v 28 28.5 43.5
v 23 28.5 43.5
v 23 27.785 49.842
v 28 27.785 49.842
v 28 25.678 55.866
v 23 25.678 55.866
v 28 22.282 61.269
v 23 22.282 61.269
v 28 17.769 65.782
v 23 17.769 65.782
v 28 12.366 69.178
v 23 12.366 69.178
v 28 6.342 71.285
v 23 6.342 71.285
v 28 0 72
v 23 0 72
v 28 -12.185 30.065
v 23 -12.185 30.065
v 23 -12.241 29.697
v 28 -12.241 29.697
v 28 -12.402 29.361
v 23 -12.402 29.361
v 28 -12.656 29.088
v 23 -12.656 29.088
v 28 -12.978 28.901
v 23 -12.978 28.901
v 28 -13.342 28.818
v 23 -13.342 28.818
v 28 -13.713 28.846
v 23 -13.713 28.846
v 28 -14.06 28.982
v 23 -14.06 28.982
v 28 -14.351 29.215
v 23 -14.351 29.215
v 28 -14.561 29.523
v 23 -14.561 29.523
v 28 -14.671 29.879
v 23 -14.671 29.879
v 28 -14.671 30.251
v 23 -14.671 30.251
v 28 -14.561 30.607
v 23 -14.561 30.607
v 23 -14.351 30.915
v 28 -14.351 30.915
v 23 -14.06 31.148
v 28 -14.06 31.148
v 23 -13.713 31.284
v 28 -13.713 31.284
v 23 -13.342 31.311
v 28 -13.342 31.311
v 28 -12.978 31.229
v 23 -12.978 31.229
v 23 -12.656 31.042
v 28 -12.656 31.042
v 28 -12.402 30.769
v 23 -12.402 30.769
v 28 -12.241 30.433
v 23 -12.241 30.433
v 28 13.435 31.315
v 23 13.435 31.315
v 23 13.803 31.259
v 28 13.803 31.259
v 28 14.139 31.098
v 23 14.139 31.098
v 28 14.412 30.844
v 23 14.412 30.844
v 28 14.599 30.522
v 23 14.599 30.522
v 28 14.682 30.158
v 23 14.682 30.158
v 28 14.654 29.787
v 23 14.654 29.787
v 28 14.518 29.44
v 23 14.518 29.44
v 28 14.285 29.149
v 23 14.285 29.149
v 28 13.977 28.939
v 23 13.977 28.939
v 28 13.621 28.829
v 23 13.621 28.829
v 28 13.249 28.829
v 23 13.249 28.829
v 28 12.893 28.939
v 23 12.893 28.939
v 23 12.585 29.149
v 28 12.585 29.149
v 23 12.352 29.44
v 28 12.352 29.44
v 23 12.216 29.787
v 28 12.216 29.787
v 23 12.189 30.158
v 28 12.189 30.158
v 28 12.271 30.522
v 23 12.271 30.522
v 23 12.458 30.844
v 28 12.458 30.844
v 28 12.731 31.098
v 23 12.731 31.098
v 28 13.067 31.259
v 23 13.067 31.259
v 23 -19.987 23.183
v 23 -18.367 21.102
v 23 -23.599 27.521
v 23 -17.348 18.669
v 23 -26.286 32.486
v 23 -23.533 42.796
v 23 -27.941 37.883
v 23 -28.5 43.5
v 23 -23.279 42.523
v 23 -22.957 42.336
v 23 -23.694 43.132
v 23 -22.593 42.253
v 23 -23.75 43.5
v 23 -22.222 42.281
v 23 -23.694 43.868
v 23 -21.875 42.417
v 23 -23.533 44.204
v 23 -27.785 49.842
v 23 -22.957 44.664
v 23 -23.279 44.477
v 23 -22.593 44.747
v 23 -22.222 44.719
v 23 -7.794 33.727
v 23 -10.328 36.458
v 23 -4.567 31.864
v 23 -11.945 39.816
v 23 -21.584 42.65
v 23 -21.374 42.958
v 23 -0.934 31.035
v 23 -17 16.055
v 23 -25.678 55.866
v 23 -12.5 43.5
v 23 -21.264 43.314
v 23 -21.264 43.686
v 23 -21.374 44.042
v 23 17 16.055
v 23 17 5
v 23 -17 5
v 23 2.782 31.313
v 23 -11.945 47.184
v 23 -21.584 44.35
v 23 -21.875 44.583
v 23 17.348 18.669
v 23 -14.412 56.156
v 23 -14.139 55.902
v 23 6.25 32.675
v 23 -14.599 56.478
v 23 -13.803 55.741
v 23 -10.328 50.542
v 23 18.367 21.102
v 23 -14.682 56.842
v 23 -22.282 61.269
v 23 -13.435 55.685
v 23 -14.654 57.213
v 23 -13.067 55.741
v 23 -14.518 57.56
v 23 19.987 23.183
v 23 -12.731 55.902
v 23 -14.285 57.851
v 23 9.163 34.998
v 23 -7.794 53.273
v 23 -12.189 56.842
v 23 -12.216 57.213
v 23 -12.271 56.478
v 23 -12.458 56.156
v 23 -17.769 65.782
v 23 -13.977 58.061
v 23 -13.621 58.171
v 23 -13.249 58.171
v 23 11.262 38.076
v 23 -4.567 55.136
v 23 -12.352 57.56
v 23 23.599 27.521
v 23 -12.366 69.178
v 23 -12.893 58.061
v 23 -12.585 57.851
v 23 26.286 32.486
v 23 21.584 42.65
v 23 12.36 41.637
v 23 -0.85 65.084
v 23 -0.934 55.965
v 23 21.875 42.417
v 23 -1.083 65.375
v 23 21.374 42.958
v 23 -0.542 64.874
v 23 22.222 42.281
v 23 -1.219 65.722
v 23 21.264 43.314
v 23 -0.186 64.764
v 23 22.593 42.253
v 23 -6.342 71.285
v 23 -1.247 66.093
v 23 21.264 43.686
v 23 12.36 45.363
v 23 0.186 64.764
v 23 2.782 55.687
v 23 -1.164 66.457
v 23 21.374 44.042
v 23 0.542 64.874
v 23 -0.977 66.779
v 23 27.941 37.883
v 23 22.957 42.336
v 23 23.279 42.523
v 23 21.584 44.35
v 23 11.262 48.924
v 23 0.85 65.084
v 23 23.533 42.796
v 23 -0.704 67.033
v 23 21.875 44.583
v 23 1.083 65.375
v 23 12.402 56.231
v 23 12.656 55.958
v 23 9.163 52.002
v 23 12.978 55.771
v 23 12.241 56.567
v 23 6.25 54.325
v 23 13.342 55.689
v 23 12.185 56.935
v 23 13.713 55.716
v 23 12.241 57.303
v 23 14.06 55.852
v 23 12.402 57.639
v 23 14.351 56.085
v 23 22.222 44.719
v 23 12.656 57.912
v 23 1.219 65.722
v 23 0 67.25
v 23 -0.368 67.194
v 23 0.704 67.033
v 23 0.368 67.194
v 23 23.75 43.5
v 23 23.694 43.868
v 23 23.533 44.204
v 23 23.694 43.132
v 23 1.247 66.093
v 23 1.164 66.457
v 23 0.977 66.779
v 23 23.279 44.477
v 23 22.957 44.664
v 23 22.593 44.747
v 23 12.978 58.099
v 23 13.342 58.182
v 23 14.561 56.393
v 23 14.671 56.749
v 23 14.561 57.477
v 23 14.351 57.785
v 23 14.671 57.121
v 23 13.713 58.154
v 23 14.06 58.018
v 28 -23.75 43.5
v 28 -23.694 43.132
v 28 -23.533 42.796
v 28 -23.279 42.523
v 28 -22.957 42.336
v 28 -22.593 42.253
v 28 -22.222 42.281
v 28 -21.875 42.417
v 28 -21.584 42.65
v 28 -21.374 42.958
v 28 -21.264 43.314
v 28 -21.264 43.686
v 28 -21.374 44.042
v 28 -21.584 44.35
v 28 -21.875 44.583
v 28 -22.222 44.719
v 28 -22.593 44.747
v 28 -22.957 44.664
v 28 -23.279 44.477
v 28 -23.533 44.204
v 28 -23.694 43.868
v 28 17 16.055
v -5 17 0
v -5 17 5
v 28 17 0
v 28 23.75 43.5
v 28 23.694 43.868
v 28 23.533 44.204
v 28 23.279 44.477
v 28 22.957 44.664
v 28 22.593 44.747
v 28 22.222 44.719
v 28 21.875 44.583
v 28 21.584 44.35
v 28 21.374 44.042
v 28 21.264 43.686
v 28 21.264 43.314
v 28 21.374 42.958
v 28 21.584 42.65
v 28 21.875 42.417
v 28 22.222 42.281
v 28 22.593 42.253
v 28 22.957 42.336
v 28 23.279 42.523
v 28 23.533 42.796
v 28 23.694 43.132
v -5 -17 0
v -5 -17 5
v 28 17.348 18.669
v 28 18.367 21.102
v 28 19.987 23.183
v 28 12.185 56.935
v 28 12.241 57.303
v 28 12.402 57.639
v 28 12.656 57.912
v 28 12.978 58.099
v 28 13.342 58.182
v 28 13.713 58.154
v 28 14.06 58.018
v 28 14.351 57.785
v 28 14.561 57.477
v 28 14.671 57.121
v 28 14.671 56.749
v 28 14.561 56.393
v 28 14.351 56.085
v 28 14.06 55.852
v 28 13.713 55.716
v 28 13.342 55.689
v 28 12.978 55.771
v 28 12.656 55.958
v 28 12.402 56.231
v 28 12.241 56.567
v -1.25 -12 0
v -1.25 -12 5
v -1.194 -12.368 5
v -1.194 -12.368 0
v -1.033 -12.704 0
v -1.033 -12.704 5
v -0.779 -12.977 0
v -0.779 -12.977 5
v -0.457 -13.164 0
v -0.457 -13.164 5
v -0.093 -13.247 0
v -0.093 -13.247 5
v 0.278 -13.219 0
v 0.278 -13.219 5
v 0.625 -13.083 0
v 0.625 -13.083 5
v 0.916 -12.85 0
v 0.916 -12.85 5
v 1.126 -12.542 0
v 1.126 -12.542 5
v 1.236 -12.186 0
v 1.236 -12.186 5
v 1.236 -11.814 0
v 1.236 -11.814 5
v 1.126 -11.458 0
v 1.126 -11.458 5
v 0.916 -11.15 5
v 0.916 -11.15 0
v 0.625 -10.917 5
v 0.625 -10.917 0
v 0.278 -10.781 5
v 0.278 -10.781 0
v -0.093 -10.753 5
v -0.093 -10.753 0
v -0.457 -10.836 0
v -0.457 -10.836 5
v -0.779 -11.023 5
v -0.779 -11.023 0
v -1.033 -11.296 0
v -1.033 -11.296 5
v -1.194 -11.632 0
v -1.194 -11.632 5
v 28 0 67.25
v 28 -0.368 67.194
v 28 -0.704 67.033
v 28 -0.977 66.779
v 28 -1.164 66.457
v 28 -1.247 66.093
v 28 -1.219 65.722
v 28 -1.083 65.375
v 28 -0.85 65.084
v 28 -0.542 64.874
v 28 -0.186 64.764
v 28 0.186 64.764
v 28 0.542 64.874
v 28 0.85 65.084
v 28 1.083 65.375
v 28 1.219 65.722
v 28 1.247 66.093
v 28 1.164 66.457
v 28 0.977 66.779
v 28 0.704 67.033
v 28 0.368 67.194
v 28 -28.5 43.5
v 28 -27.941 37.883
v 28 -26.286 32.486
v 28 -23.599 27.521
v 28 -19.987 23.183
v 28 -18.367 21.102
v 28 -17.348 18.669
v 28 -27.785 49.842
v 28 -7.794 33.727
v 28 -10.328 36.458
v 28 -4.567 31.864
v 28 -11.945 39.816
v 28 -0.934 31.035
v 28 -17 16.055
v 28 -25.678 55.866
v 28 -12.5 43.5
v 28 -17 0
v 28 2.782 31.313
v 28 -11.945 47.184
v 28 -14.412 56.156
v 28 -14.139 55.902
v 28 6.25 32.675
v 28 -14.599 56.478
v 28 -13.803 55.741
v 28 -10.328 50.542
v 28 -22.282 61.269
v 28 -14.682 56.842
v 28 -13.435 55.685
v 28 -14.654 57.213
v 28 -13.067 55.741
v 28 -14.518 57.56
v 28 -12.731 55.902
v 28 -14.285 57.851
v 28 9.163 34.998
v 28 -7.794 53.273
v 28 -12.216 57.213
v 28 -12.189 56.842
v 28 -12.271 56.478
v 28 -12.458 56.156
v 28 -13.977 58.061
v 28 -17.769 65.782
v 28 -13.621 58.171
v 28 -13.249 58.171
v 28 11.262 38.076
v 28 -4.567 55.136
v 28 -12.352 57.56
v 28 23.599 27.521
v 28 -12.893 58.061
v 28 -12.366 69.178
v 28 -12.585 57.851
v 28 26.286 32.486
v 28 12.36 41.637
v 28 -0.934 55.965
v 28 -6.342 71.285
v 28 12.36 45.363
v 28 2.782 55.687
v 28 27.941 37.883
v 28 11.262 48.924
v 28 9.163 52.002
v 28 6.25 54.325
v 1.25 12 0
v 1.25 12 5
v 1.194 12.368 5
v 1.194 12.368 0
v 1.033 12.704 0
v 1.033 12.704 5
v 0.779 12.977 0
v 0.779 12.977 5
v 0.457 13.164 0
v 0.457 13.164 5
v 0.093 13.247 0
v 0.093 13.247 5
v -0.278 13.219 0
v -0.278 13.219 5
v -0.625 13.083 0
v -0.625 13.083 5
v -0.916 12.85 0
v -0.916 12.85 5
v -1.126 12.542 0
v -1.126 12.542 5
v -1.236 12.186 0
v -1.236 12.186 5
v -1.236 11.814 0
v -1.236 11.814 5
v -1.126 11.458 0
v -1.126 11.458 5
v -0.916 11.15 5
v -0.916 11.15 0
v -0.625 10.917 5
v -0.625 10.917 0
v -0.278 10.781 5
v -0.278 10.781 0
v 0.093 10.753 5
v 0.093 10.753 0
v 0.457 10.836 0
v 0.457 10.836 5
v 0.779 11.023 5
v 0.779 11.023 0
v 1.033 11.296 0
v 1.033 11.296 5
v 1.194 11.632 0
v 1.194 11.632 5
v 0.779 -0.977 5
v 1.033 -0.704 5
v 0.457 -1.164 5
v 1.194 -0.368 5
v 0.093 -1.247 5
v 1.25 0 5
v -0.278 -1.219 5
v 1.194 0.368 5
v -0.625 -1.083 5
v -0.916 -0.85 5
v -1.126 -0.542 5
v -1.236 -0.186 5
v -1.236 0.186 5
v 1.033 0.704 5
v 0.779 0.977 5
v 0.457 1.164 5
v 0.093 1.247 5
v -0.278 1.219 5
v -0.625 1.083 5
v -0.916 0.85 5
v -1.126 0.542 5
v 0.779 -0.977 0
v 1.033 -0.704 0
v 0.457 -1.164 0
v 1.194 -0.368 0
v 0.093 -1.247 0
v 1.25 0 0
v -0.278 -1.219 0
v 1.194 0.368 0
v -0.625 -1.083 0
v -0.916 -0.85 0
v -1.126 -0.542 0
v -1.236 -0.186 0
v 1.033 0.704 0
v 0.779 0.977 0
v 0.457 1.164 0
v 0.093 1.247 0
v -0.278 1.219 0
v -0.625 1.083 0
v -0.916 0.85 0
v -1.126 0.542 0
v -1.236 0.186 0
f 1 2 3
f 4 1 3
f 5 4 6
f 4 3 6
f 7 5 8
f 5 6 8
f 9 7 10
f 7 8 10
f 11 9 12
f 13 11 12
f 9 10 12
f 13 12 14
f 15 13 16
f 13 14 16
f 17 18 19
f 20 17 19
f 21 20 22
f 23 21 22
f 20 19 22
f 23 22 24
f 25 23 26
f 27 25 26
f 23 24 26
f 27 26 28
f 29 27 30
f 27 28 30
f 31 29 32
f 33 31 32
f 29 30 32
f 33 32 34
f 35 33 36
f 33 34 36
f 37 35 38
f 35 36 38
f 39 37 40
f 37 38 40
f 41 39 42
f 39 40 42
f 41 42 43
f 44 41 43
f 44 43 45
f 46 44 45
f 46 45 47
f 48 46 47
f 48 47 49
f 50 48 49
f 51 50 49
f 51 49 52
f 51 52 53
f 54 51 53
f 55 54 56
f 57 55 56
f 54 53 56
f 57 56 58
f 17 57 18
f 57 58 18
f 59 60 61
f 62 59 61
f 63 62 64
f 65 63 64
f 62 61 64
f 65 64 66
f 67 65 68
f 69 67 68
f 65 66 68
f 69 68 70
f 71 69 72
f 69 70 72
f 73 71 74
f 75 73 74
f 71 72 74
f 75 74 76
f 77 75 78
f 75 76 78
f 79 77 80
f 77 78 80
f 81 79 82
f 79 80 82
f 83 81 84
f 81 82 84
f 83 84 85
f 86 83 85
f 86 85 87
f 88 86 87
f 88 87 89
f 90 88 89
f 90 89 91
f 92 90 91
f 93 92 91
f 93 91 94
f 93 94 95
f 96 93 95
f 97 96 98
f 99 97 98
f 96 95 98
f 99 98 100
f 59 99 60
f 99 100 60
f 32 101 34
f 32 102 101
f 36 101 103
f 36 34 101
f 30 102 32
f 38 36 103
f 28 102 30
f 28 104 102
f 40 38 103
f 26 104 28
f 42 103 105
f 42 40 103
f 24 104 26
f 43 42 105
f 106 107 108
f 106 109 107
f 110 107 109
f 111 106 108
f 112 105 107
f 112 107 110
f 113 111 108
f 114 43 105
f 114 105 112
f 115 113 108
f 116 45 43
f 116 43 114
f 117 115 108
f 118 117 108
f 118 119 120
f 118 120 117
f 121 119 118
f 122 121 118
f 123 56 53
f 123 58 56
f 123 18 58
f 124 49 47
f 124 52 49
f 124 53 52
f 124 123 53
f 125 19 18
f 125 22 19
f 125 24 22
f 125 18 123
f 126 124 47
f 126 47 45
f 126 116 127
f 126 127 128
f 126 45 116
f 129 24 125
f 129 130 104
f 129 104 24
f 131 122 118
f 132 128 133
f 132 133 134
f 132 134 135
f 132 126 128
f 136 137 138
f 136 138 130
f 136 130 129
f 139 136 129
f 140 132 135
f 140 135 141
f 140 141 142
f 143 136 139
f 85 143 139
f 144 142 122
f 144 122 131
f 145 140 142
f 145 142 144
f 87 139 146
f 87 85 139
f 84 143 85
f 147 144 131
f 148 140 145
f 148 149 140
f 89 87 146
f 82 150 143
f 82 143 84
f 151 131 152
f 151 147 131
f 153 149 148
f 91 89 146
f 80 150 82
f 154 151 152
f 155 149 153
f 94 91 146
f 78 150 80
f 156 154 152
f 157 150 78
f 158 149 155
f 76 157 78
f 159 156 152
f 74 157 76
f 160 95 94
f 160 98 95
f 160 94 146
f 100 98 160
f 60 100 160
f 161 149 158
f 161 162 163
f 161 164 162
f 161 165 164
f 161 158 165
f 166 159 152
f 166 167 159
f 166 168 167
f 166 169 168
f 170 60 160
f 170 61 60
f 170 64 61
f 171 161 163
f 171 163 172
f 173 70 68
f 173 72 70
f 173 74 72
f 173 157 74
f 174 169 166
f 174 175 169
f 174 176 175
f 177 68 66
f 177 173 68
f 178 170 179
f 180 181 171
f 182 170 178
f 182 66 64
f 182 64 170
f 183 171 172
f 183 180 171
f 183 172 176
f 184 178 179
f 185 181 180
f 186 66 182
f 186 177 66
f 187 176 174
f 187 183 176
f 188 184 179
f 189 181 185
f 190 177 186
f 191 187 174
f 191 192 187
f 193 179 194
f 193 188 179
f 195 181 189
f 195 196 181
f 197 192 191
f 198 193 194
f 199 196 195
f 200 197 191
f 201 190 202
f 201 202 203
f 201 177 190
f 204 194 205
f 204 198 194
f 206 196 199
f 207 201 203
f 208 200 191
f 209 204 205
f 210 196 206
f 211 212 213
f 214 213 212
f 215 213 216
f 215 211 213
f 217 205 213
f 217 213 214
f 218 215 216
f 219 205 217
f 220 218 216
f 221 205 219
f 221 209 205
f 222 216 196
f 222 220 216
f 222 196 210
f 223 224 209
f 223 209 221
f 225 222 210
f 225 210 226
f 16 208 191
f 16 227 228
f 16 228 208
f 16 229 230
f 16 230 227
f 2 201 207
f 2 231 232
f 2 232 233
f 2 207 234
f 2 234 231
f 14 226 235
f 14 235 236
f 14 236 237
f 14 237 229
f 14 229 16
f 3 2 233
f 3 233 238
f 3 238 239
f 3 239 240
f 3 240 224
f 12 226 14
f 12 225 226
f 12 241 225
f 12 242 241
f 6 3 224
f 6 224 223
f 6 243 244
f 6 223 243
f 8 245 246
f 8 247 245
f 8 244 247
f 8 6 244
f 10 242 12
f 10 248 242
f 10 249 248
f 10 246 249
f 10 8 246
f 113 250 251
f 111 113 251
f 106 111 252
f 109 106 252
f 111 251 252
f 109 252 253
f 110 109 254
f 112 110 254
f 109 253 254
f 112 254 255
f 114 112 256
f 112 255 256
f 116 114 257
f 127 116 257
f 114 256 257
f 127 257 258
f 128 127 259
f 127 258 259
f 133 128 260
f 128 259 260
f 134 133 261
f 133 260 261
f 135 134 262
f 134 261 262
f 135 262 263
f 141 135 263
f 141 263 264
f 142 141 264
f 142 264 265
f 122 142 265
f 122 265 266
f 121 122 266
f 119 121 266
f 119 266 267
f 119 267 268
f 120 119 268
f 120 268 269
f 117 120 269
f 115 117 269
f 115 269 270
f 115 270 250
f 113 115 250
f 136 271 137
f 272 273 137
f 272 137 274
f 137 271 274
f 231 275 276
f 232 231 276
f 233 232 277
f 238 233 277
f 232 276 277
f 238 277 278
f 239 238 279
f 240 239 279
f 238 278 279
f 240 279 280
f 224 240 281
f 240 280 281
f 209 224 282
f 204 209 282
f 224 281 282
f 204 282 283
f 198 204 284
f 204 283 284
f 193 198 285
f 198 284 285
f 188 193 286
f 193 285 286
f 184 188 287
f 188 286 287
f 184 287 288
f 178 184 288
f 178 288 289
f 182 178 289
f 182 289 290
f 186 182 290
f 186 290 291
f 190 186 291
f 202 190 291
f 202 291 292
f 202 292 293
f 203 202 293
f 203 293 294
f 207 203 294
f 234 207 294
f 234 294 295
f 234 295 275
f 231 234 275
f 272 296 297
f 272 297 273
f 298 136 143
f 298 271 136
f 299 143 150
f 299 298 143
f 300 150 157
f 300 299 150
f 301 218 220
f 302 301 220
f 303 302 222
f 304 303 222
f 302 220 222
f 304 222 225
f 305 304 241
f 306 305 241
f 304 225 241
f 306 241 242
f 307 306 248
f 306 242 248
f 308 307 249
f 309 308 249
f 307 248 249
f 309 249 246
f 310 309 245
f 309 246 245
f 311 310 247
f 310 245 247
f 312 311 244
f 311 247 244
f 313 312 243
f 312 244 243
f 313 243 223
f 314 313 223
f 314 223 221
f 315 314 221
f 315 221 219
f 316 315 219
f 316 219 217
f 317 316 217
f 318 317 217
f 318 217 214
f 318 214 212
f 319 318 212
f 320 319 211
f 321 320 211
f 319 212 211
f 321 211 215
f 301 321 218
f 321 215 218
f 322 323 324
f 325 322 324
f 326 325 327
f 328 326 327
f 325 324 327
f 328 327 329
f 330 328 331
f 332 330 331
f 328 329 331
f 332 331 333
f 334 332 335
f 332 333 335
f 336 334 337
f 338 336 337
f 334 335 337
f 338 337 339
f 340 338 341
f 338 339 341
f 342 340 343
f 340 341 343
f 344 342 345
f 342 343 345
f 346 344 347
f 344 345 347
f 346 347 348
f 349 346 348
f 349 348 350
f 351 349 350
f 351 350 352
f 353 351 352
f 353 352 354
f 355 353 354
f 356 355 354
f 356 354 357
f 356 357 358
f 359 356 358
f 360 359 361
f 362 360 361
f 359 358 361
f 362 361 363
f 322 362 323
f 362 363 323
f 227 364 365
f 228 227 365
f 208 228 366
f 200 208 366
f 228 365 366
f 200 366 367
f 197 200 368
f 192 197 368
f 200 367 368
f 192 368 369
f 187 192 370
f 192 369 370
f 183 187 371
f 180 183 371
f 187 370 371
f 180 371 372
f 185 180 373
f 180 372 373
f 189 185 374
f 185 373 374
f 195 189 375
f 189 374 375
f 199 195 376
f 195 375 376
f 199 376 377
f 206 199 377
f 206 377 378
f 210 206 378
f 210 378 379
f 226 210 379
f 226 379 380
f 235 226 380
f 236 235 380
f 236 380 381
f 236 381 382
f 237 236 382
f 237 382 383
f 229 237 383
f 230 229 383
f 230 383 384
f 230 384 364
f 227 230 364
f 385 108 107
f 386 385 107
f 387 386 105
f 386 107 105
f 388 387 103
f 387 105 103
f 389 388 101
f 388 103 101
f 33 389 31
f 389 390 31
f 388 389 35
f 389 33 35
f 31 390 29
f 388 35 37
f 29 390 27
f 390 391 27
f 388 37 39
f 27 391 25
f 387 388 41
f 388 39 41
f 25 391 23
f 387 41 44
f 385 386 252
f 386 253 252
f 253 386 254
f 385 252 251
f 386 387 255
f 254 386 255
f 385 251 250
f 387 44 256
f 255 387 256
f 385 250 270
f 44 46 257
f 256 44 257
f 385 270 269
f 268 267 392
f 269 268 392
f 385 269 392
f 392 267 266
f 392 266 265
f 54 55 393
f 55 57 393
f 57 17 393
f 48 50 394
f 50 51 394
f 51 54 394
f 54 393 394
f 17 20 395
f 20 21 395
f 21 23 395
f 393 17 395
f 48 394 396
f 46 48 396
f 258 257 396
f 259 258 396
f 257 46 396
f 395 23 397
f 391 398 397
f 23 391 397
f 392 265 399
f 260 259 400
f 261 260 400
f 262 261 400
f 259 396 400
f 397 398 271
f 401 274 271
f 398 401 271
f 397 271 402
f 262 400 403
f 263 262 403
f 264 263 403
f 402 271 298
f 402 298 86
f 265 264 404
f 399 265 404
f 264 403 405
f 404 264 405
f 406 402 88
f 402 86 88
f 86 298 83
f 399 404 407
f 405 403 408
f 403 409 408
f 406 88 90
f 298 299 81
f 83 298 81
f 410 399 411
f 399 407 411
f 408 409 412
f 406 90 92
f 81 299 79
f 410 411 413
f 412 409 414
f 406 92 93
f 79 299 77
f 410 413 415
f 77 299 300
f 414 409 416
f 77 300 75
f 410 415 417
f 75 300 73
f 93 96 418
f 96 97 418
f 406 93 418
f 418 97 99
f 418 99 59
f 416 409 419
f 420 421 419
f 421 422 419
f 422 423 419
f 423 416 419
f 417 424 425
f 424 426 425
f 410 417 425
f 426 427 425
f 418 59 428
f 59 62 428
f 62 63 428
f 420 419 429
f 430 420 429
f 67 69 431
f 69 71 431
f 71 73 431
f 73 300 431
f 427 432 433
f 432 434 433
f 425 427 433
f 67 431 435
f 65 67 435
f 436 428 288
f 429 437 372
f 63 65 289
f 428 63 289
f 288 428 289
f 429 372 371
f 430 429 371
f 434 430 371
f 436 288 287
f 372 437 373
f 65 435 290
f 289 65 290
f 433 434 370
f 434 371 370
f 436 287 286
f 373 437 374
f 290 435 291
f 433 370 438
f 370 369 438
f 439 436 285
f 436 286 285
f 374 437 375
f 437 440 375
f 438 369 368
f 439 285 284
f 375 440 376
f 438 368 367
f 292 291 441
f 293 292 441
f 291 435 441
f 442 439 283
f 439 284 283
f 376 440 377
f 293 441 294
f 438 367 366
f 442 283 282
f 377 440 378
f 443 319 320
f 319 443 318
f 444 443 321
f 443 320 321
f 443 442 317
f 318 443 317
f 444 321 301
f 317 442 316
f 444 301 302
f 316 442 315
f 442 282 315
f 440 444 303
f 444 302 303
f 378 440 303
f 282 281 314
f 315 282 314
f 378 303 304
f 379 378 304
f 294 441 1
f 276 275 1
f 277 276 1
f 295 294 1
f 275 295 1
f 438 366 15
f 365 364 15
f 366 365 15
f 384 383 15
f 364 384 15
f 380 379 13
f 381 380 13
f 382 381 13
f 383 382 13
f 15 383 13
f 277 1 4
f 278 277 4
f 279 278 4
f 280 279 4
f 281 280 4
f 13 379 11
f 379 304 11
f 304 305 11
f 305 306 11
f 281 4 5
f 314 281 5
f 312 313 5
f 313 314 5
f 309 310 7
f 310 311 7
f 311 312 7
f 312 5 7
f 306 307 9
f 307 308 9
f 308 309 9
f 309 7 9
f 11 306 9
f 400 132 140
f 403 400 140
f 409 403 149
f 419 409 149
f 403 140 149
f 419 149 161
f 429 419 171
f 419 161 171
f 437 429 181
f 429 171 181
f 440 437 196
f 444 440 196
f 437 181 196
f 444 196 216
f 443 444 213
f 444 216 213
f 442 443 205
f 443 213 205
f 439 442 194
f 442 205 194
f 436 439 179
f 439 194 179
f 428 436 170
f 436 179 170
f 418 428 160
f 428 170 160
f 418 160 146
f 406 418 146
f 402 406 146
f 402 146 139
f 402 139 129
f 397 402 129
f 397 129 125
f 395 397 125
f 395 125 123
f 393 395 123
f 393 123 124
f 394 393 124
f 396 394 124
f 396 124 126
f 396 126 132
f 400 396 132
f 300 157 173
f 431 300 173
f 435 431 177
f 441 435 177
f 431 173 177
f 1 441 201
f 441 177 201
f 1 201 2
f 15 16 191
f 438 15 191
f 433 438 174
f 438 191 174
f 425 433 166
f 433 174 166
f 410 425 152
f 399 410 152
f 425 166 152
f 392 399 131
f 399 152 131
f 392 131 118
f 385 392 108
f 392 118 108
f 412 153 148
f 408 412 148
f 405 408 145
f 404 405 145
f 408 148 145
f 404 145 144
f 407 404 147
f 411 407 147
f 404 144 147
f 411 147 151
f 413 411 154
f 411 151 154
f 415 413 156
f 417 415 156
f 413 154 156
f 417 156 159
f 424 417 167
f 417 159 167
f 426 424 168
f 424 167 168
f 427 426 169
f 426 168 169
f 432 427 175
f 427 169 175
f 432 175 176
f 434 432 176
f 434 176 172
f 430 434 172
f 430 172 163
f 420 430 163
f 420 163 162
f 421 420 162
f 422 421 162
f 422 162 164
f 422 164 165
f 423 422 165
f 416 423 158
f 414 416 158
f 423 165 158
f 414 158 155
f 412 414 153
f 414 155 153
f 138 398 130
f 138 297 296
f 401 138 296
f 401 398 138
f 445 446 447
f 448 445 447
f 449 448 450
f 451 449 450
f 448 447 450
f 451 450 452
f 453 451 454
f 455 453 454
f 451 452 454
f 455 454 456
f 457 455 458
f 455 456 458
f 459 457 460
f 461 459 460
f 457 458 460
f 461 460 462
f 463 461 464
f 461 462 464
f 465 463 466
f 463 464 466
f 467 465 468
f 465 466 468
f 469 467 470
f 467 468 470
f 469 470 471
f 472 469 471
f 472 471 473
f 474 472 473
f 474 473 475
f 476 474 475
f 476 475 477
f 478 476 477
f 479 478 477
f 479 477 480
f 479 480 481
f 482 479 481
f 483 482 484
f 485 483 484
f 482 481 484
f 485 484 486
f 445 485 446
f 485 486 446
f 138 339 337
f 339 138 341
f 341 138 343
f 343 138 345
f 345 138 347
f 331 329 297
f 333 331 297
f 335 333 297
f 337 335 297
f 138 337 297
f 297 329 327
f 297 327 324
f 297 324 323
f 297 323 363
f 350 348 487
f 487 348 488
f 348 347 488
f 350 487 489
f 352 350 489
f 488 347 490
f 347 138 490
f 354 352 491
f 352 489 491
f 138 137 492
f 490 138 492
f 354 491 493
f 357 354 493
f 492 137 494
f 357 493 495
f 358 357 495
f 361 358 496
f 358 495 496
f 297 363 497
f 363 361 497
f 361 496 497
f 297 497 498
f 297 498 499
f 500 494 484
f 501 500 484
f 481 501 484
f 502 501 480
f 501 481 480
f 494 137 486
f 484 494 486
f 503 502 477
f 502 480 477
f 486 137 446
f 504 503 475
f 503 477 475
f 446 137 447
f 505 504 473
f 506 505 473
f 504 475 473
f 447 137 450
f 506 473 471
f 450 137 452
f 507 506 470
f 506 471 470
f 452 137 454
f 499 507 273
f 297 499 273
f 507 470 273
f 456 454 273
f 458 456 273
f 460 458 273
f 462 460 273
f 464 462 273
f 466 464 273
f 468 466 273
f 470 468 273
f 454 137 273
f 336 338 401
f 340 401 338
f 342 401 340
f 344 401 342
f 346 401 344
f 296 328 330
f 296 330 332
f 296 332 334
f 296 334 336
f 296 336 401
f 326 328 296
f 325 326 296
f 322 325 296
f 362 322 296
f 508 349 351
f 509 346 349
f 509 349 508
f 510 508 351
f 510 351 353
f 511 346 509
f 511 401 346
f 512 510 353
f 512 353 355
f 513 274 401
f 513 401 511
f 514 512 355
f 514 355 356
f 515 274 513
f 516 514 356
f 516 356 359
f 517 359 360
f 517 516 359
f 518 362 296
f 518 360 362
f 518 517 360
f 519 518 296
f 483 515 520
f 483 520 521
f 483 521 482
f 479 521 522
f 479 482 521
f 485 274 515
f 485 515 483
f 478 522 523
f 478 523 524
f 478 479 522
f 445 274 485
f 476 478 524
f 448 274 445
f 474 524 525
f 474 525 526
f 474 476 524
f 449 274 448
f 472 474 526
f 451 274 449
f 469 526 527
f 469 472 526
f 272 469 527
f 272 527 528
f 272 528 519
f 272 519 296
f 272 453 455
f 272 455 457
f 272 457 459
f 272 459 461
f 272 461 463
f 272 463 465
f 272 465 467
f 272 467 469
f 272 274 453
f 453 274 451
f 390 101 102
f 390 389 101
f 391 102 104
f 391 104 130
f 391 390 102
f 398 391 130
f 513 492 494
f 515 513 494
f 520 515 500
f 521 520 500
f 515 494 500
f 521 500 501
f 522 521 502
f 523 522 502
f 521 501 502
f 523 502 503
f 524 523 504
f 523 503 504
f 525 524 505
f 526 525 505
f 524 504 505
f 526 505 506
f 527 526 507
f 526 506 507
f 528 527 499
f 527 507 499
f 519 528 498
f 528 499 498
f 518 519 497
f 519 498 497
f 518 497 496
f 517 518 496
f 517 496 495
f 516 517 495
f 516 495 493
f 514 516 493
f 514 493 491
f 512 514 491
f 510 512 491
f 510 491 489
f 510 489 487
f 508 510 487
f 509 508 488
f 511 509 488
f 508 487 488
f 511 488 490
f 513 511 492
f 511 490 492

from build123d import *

# Parameters (mm, degrees)
EXTRUDE_1_DEPTH          = 5
SKETCH_2_W               = 67
SKETCH_2_H               = 34
EXTRUDE_2_DEPTH          = 5
SKETCH_4_W               = 57
SKETCH_4_H               = 57
EXTRUDE_3_DEPTH          = 5
CUT_EXTRUDE_1_DEPTH      = 5
FILLET_1_R               = 10
FILLET_2_R               = 10
SKETCH_6_R               = 1.25
SKETCH_6_R_2             = 12.5
CUT_EXTRUDE_2_DEPTH      = 5
PATTERN_CIRCULAR_1_COUNT = 4
SKETCH_7_R               = 1.25
CUT_EXTRUDE_3_DEPTH      = 5
SKETCH_8_R               = 1.25
CUT_EXTRUDE_5_DEPTH      = 10
PATTERN_CIRCULAR_2_COUNT = 3
PATTERN_CIRCULAR_2_ANGLE = 180


with BuildPart() as part:
    # 草图1 → 凸台-拉伸1 (new body)
    with BuildSketch(Plane.XY):
        Polygon((23, 17), (28, 17), (28, -17), (23, -17), (-5, -17), (-5, 17), align=None)
    extrude(amount=EXTRUDE_1_DEPTH)

    # 草图2 → 凸台-拉伸2 (add)
    with BuildSketch(Plane(origin=(28, 0, 0), x_dir=(0, 0, -1), z_dir=(1, 0, 0))):
        with Locations((-38.5, 0)):
            Rectangle(SKETCH_2_W, SKETCH_2_H)
    extrude(amount=-EXTRUDE_2_DEPTH)

    # 草图4 → 凸台-拉伸3 (add)
    with BuildSketch(Plane.ZY.offset(-23)):
        with Locations((43.5, 0)):
            Rectangle(SKETCH_4_W, SKETCH_4_H)
    extrude(amount=-EXTRUDE_3_DEPTH)

    # 草图5 → 切除-拉伸1 (cut)
    with BuildSketch(Plane.ZY.offset(-23)):
        with BuildLine():
            Line((15, 28.5), (15, 17))
            Line((15, 17), (20.625341533, 17))
            ThreePointArc((20.625341533, 17), (30.698632886, 25.463208753), (43.5, 28.5))
            Line((43.5, 28.5), (15, 28.5))
        make_face()
        with BuildLine():
            ThreePointArc((43.500000073, -28.5), (30.698632918, -25.463208769), (20.625341533, -17))
            Line((20.625341533, -17), (15, -17))
            Line((15, -17), (15, -28.5))
            Line((15, -28.5), (43.500000073, -28.5))
        make_face()
        with BuildLine():
            ThreePointArc((72, 0), (63.65254329, -20.152543238), (43.500000073, -28.5))
            Line((43.500000073, -28.5), (72, -28.5))
            Line((72, -28.5), (72, 0))
        make_face()
        with BuildLine():
            Line((72, 28.5), (43.5, 28.5))
            ThreePointArc((43.5, 28.5), (63.652543264, 20.152543264), (72, 0))
            Line((72, 0), (72, 28.5))
        make_face()
    extrude(amount=-CUT_EXTRUDE_1_DEPTH, mode=Mode.SUBTRACT)

    # 圆角1
    fillet_1_edges = [part.edges().sort_by_distance(p)[0] for p in [
        (25.5, 17, 20.625341533),
    ]]
    fillet(fillet_1_edges, radius=FILLET_1_R)

    # 圆角2
    fillet_2_edges = [part.edges().sort_by_distance(p)[0] for p in [
        (25.5, -17, 20.625341533),
    ]]
    fillet(fillet_2_edges, radius=FILLET_2_R)

    # 草图6 → 切除-拉伸2 (cut)
    with BuildSketch(Plane.ZY.offset(-23)):
        with Locations(Location((56.935028843, 13.435028843, 0), (0, 0, 270))):
            Circle(SKETCH_6_R)
        with Locations(Location((43.5, 0, 0), (0, 0, 270))):
            Circle(SKETCH_6_R_2)
    cut_extrude_2 = extrude(amount=-CUT_EXTRUDE_2_DEPTH, mode=Mode.SUBTRACT)

    # 阵列(圆周)1: 切除-拉伸2 ×4 about axis
    pattern_circular_1_axis = Axis((0, 0, 43.5), (1, 0, 0))
    for i in range(1, PATTERN_CIRCULAR_1_COUNT):
        add(cut_extrude_2.rotate(pattern_circular_1_axis, i * 360 / PATTERN_CIRCULAR_1_COUNT), mode=Mode.SUBTRACT)

    # 草图7 → 切除-拉伸3 (cut)
    with BuildSketch(Plane.XY.offset(5)):
        Circle(SKETCH_7_R)
        with Locations((0, 12)):
            Circle(SKETCH_7_R)
        with Locations(Location((0, -12, 0), (0, 0, 180))):
            Circle(SKETCH_7_R)
    extrude(amount=-CUT_EXTRUDE_3_DEPTH, mode=Mode.SUBTRACT)

    # 草图8 → 切除-拉伸5 (cut)
    with BuildSketch(Plane(origin=(28, 0, 0), x_dir=(0, 0, -1), z_dir=(1, 0, 0))):
        with Locations(Location((-43.5, 22.5, 0), (0, 0, 90))):
            Circle(SKETCH_8_R)
    cut_extrude_5 = extrude(amount=-CUT_EXTRUDE_5_DEPTH, mode=Mode.SUBTRACT)

    # 阵列(圆周)2: 切除-拉伸5 ×3 about axis
    pattern_circular_2_axis = Axis((0, 0, 43.5), (1, 0, 0))
    for i in range(1, PATTERN_CIRCULAR_2_COUNT):
        add(cut_extrude_5.rotate(pattern_circular_2_axis, i * PATTERN_CIRCULAR_2_ANGLE / (PATTERN_CIRCULAR_2_COUNT - 1)), mode=Mode.SUBTRACT)


solid = part.part
